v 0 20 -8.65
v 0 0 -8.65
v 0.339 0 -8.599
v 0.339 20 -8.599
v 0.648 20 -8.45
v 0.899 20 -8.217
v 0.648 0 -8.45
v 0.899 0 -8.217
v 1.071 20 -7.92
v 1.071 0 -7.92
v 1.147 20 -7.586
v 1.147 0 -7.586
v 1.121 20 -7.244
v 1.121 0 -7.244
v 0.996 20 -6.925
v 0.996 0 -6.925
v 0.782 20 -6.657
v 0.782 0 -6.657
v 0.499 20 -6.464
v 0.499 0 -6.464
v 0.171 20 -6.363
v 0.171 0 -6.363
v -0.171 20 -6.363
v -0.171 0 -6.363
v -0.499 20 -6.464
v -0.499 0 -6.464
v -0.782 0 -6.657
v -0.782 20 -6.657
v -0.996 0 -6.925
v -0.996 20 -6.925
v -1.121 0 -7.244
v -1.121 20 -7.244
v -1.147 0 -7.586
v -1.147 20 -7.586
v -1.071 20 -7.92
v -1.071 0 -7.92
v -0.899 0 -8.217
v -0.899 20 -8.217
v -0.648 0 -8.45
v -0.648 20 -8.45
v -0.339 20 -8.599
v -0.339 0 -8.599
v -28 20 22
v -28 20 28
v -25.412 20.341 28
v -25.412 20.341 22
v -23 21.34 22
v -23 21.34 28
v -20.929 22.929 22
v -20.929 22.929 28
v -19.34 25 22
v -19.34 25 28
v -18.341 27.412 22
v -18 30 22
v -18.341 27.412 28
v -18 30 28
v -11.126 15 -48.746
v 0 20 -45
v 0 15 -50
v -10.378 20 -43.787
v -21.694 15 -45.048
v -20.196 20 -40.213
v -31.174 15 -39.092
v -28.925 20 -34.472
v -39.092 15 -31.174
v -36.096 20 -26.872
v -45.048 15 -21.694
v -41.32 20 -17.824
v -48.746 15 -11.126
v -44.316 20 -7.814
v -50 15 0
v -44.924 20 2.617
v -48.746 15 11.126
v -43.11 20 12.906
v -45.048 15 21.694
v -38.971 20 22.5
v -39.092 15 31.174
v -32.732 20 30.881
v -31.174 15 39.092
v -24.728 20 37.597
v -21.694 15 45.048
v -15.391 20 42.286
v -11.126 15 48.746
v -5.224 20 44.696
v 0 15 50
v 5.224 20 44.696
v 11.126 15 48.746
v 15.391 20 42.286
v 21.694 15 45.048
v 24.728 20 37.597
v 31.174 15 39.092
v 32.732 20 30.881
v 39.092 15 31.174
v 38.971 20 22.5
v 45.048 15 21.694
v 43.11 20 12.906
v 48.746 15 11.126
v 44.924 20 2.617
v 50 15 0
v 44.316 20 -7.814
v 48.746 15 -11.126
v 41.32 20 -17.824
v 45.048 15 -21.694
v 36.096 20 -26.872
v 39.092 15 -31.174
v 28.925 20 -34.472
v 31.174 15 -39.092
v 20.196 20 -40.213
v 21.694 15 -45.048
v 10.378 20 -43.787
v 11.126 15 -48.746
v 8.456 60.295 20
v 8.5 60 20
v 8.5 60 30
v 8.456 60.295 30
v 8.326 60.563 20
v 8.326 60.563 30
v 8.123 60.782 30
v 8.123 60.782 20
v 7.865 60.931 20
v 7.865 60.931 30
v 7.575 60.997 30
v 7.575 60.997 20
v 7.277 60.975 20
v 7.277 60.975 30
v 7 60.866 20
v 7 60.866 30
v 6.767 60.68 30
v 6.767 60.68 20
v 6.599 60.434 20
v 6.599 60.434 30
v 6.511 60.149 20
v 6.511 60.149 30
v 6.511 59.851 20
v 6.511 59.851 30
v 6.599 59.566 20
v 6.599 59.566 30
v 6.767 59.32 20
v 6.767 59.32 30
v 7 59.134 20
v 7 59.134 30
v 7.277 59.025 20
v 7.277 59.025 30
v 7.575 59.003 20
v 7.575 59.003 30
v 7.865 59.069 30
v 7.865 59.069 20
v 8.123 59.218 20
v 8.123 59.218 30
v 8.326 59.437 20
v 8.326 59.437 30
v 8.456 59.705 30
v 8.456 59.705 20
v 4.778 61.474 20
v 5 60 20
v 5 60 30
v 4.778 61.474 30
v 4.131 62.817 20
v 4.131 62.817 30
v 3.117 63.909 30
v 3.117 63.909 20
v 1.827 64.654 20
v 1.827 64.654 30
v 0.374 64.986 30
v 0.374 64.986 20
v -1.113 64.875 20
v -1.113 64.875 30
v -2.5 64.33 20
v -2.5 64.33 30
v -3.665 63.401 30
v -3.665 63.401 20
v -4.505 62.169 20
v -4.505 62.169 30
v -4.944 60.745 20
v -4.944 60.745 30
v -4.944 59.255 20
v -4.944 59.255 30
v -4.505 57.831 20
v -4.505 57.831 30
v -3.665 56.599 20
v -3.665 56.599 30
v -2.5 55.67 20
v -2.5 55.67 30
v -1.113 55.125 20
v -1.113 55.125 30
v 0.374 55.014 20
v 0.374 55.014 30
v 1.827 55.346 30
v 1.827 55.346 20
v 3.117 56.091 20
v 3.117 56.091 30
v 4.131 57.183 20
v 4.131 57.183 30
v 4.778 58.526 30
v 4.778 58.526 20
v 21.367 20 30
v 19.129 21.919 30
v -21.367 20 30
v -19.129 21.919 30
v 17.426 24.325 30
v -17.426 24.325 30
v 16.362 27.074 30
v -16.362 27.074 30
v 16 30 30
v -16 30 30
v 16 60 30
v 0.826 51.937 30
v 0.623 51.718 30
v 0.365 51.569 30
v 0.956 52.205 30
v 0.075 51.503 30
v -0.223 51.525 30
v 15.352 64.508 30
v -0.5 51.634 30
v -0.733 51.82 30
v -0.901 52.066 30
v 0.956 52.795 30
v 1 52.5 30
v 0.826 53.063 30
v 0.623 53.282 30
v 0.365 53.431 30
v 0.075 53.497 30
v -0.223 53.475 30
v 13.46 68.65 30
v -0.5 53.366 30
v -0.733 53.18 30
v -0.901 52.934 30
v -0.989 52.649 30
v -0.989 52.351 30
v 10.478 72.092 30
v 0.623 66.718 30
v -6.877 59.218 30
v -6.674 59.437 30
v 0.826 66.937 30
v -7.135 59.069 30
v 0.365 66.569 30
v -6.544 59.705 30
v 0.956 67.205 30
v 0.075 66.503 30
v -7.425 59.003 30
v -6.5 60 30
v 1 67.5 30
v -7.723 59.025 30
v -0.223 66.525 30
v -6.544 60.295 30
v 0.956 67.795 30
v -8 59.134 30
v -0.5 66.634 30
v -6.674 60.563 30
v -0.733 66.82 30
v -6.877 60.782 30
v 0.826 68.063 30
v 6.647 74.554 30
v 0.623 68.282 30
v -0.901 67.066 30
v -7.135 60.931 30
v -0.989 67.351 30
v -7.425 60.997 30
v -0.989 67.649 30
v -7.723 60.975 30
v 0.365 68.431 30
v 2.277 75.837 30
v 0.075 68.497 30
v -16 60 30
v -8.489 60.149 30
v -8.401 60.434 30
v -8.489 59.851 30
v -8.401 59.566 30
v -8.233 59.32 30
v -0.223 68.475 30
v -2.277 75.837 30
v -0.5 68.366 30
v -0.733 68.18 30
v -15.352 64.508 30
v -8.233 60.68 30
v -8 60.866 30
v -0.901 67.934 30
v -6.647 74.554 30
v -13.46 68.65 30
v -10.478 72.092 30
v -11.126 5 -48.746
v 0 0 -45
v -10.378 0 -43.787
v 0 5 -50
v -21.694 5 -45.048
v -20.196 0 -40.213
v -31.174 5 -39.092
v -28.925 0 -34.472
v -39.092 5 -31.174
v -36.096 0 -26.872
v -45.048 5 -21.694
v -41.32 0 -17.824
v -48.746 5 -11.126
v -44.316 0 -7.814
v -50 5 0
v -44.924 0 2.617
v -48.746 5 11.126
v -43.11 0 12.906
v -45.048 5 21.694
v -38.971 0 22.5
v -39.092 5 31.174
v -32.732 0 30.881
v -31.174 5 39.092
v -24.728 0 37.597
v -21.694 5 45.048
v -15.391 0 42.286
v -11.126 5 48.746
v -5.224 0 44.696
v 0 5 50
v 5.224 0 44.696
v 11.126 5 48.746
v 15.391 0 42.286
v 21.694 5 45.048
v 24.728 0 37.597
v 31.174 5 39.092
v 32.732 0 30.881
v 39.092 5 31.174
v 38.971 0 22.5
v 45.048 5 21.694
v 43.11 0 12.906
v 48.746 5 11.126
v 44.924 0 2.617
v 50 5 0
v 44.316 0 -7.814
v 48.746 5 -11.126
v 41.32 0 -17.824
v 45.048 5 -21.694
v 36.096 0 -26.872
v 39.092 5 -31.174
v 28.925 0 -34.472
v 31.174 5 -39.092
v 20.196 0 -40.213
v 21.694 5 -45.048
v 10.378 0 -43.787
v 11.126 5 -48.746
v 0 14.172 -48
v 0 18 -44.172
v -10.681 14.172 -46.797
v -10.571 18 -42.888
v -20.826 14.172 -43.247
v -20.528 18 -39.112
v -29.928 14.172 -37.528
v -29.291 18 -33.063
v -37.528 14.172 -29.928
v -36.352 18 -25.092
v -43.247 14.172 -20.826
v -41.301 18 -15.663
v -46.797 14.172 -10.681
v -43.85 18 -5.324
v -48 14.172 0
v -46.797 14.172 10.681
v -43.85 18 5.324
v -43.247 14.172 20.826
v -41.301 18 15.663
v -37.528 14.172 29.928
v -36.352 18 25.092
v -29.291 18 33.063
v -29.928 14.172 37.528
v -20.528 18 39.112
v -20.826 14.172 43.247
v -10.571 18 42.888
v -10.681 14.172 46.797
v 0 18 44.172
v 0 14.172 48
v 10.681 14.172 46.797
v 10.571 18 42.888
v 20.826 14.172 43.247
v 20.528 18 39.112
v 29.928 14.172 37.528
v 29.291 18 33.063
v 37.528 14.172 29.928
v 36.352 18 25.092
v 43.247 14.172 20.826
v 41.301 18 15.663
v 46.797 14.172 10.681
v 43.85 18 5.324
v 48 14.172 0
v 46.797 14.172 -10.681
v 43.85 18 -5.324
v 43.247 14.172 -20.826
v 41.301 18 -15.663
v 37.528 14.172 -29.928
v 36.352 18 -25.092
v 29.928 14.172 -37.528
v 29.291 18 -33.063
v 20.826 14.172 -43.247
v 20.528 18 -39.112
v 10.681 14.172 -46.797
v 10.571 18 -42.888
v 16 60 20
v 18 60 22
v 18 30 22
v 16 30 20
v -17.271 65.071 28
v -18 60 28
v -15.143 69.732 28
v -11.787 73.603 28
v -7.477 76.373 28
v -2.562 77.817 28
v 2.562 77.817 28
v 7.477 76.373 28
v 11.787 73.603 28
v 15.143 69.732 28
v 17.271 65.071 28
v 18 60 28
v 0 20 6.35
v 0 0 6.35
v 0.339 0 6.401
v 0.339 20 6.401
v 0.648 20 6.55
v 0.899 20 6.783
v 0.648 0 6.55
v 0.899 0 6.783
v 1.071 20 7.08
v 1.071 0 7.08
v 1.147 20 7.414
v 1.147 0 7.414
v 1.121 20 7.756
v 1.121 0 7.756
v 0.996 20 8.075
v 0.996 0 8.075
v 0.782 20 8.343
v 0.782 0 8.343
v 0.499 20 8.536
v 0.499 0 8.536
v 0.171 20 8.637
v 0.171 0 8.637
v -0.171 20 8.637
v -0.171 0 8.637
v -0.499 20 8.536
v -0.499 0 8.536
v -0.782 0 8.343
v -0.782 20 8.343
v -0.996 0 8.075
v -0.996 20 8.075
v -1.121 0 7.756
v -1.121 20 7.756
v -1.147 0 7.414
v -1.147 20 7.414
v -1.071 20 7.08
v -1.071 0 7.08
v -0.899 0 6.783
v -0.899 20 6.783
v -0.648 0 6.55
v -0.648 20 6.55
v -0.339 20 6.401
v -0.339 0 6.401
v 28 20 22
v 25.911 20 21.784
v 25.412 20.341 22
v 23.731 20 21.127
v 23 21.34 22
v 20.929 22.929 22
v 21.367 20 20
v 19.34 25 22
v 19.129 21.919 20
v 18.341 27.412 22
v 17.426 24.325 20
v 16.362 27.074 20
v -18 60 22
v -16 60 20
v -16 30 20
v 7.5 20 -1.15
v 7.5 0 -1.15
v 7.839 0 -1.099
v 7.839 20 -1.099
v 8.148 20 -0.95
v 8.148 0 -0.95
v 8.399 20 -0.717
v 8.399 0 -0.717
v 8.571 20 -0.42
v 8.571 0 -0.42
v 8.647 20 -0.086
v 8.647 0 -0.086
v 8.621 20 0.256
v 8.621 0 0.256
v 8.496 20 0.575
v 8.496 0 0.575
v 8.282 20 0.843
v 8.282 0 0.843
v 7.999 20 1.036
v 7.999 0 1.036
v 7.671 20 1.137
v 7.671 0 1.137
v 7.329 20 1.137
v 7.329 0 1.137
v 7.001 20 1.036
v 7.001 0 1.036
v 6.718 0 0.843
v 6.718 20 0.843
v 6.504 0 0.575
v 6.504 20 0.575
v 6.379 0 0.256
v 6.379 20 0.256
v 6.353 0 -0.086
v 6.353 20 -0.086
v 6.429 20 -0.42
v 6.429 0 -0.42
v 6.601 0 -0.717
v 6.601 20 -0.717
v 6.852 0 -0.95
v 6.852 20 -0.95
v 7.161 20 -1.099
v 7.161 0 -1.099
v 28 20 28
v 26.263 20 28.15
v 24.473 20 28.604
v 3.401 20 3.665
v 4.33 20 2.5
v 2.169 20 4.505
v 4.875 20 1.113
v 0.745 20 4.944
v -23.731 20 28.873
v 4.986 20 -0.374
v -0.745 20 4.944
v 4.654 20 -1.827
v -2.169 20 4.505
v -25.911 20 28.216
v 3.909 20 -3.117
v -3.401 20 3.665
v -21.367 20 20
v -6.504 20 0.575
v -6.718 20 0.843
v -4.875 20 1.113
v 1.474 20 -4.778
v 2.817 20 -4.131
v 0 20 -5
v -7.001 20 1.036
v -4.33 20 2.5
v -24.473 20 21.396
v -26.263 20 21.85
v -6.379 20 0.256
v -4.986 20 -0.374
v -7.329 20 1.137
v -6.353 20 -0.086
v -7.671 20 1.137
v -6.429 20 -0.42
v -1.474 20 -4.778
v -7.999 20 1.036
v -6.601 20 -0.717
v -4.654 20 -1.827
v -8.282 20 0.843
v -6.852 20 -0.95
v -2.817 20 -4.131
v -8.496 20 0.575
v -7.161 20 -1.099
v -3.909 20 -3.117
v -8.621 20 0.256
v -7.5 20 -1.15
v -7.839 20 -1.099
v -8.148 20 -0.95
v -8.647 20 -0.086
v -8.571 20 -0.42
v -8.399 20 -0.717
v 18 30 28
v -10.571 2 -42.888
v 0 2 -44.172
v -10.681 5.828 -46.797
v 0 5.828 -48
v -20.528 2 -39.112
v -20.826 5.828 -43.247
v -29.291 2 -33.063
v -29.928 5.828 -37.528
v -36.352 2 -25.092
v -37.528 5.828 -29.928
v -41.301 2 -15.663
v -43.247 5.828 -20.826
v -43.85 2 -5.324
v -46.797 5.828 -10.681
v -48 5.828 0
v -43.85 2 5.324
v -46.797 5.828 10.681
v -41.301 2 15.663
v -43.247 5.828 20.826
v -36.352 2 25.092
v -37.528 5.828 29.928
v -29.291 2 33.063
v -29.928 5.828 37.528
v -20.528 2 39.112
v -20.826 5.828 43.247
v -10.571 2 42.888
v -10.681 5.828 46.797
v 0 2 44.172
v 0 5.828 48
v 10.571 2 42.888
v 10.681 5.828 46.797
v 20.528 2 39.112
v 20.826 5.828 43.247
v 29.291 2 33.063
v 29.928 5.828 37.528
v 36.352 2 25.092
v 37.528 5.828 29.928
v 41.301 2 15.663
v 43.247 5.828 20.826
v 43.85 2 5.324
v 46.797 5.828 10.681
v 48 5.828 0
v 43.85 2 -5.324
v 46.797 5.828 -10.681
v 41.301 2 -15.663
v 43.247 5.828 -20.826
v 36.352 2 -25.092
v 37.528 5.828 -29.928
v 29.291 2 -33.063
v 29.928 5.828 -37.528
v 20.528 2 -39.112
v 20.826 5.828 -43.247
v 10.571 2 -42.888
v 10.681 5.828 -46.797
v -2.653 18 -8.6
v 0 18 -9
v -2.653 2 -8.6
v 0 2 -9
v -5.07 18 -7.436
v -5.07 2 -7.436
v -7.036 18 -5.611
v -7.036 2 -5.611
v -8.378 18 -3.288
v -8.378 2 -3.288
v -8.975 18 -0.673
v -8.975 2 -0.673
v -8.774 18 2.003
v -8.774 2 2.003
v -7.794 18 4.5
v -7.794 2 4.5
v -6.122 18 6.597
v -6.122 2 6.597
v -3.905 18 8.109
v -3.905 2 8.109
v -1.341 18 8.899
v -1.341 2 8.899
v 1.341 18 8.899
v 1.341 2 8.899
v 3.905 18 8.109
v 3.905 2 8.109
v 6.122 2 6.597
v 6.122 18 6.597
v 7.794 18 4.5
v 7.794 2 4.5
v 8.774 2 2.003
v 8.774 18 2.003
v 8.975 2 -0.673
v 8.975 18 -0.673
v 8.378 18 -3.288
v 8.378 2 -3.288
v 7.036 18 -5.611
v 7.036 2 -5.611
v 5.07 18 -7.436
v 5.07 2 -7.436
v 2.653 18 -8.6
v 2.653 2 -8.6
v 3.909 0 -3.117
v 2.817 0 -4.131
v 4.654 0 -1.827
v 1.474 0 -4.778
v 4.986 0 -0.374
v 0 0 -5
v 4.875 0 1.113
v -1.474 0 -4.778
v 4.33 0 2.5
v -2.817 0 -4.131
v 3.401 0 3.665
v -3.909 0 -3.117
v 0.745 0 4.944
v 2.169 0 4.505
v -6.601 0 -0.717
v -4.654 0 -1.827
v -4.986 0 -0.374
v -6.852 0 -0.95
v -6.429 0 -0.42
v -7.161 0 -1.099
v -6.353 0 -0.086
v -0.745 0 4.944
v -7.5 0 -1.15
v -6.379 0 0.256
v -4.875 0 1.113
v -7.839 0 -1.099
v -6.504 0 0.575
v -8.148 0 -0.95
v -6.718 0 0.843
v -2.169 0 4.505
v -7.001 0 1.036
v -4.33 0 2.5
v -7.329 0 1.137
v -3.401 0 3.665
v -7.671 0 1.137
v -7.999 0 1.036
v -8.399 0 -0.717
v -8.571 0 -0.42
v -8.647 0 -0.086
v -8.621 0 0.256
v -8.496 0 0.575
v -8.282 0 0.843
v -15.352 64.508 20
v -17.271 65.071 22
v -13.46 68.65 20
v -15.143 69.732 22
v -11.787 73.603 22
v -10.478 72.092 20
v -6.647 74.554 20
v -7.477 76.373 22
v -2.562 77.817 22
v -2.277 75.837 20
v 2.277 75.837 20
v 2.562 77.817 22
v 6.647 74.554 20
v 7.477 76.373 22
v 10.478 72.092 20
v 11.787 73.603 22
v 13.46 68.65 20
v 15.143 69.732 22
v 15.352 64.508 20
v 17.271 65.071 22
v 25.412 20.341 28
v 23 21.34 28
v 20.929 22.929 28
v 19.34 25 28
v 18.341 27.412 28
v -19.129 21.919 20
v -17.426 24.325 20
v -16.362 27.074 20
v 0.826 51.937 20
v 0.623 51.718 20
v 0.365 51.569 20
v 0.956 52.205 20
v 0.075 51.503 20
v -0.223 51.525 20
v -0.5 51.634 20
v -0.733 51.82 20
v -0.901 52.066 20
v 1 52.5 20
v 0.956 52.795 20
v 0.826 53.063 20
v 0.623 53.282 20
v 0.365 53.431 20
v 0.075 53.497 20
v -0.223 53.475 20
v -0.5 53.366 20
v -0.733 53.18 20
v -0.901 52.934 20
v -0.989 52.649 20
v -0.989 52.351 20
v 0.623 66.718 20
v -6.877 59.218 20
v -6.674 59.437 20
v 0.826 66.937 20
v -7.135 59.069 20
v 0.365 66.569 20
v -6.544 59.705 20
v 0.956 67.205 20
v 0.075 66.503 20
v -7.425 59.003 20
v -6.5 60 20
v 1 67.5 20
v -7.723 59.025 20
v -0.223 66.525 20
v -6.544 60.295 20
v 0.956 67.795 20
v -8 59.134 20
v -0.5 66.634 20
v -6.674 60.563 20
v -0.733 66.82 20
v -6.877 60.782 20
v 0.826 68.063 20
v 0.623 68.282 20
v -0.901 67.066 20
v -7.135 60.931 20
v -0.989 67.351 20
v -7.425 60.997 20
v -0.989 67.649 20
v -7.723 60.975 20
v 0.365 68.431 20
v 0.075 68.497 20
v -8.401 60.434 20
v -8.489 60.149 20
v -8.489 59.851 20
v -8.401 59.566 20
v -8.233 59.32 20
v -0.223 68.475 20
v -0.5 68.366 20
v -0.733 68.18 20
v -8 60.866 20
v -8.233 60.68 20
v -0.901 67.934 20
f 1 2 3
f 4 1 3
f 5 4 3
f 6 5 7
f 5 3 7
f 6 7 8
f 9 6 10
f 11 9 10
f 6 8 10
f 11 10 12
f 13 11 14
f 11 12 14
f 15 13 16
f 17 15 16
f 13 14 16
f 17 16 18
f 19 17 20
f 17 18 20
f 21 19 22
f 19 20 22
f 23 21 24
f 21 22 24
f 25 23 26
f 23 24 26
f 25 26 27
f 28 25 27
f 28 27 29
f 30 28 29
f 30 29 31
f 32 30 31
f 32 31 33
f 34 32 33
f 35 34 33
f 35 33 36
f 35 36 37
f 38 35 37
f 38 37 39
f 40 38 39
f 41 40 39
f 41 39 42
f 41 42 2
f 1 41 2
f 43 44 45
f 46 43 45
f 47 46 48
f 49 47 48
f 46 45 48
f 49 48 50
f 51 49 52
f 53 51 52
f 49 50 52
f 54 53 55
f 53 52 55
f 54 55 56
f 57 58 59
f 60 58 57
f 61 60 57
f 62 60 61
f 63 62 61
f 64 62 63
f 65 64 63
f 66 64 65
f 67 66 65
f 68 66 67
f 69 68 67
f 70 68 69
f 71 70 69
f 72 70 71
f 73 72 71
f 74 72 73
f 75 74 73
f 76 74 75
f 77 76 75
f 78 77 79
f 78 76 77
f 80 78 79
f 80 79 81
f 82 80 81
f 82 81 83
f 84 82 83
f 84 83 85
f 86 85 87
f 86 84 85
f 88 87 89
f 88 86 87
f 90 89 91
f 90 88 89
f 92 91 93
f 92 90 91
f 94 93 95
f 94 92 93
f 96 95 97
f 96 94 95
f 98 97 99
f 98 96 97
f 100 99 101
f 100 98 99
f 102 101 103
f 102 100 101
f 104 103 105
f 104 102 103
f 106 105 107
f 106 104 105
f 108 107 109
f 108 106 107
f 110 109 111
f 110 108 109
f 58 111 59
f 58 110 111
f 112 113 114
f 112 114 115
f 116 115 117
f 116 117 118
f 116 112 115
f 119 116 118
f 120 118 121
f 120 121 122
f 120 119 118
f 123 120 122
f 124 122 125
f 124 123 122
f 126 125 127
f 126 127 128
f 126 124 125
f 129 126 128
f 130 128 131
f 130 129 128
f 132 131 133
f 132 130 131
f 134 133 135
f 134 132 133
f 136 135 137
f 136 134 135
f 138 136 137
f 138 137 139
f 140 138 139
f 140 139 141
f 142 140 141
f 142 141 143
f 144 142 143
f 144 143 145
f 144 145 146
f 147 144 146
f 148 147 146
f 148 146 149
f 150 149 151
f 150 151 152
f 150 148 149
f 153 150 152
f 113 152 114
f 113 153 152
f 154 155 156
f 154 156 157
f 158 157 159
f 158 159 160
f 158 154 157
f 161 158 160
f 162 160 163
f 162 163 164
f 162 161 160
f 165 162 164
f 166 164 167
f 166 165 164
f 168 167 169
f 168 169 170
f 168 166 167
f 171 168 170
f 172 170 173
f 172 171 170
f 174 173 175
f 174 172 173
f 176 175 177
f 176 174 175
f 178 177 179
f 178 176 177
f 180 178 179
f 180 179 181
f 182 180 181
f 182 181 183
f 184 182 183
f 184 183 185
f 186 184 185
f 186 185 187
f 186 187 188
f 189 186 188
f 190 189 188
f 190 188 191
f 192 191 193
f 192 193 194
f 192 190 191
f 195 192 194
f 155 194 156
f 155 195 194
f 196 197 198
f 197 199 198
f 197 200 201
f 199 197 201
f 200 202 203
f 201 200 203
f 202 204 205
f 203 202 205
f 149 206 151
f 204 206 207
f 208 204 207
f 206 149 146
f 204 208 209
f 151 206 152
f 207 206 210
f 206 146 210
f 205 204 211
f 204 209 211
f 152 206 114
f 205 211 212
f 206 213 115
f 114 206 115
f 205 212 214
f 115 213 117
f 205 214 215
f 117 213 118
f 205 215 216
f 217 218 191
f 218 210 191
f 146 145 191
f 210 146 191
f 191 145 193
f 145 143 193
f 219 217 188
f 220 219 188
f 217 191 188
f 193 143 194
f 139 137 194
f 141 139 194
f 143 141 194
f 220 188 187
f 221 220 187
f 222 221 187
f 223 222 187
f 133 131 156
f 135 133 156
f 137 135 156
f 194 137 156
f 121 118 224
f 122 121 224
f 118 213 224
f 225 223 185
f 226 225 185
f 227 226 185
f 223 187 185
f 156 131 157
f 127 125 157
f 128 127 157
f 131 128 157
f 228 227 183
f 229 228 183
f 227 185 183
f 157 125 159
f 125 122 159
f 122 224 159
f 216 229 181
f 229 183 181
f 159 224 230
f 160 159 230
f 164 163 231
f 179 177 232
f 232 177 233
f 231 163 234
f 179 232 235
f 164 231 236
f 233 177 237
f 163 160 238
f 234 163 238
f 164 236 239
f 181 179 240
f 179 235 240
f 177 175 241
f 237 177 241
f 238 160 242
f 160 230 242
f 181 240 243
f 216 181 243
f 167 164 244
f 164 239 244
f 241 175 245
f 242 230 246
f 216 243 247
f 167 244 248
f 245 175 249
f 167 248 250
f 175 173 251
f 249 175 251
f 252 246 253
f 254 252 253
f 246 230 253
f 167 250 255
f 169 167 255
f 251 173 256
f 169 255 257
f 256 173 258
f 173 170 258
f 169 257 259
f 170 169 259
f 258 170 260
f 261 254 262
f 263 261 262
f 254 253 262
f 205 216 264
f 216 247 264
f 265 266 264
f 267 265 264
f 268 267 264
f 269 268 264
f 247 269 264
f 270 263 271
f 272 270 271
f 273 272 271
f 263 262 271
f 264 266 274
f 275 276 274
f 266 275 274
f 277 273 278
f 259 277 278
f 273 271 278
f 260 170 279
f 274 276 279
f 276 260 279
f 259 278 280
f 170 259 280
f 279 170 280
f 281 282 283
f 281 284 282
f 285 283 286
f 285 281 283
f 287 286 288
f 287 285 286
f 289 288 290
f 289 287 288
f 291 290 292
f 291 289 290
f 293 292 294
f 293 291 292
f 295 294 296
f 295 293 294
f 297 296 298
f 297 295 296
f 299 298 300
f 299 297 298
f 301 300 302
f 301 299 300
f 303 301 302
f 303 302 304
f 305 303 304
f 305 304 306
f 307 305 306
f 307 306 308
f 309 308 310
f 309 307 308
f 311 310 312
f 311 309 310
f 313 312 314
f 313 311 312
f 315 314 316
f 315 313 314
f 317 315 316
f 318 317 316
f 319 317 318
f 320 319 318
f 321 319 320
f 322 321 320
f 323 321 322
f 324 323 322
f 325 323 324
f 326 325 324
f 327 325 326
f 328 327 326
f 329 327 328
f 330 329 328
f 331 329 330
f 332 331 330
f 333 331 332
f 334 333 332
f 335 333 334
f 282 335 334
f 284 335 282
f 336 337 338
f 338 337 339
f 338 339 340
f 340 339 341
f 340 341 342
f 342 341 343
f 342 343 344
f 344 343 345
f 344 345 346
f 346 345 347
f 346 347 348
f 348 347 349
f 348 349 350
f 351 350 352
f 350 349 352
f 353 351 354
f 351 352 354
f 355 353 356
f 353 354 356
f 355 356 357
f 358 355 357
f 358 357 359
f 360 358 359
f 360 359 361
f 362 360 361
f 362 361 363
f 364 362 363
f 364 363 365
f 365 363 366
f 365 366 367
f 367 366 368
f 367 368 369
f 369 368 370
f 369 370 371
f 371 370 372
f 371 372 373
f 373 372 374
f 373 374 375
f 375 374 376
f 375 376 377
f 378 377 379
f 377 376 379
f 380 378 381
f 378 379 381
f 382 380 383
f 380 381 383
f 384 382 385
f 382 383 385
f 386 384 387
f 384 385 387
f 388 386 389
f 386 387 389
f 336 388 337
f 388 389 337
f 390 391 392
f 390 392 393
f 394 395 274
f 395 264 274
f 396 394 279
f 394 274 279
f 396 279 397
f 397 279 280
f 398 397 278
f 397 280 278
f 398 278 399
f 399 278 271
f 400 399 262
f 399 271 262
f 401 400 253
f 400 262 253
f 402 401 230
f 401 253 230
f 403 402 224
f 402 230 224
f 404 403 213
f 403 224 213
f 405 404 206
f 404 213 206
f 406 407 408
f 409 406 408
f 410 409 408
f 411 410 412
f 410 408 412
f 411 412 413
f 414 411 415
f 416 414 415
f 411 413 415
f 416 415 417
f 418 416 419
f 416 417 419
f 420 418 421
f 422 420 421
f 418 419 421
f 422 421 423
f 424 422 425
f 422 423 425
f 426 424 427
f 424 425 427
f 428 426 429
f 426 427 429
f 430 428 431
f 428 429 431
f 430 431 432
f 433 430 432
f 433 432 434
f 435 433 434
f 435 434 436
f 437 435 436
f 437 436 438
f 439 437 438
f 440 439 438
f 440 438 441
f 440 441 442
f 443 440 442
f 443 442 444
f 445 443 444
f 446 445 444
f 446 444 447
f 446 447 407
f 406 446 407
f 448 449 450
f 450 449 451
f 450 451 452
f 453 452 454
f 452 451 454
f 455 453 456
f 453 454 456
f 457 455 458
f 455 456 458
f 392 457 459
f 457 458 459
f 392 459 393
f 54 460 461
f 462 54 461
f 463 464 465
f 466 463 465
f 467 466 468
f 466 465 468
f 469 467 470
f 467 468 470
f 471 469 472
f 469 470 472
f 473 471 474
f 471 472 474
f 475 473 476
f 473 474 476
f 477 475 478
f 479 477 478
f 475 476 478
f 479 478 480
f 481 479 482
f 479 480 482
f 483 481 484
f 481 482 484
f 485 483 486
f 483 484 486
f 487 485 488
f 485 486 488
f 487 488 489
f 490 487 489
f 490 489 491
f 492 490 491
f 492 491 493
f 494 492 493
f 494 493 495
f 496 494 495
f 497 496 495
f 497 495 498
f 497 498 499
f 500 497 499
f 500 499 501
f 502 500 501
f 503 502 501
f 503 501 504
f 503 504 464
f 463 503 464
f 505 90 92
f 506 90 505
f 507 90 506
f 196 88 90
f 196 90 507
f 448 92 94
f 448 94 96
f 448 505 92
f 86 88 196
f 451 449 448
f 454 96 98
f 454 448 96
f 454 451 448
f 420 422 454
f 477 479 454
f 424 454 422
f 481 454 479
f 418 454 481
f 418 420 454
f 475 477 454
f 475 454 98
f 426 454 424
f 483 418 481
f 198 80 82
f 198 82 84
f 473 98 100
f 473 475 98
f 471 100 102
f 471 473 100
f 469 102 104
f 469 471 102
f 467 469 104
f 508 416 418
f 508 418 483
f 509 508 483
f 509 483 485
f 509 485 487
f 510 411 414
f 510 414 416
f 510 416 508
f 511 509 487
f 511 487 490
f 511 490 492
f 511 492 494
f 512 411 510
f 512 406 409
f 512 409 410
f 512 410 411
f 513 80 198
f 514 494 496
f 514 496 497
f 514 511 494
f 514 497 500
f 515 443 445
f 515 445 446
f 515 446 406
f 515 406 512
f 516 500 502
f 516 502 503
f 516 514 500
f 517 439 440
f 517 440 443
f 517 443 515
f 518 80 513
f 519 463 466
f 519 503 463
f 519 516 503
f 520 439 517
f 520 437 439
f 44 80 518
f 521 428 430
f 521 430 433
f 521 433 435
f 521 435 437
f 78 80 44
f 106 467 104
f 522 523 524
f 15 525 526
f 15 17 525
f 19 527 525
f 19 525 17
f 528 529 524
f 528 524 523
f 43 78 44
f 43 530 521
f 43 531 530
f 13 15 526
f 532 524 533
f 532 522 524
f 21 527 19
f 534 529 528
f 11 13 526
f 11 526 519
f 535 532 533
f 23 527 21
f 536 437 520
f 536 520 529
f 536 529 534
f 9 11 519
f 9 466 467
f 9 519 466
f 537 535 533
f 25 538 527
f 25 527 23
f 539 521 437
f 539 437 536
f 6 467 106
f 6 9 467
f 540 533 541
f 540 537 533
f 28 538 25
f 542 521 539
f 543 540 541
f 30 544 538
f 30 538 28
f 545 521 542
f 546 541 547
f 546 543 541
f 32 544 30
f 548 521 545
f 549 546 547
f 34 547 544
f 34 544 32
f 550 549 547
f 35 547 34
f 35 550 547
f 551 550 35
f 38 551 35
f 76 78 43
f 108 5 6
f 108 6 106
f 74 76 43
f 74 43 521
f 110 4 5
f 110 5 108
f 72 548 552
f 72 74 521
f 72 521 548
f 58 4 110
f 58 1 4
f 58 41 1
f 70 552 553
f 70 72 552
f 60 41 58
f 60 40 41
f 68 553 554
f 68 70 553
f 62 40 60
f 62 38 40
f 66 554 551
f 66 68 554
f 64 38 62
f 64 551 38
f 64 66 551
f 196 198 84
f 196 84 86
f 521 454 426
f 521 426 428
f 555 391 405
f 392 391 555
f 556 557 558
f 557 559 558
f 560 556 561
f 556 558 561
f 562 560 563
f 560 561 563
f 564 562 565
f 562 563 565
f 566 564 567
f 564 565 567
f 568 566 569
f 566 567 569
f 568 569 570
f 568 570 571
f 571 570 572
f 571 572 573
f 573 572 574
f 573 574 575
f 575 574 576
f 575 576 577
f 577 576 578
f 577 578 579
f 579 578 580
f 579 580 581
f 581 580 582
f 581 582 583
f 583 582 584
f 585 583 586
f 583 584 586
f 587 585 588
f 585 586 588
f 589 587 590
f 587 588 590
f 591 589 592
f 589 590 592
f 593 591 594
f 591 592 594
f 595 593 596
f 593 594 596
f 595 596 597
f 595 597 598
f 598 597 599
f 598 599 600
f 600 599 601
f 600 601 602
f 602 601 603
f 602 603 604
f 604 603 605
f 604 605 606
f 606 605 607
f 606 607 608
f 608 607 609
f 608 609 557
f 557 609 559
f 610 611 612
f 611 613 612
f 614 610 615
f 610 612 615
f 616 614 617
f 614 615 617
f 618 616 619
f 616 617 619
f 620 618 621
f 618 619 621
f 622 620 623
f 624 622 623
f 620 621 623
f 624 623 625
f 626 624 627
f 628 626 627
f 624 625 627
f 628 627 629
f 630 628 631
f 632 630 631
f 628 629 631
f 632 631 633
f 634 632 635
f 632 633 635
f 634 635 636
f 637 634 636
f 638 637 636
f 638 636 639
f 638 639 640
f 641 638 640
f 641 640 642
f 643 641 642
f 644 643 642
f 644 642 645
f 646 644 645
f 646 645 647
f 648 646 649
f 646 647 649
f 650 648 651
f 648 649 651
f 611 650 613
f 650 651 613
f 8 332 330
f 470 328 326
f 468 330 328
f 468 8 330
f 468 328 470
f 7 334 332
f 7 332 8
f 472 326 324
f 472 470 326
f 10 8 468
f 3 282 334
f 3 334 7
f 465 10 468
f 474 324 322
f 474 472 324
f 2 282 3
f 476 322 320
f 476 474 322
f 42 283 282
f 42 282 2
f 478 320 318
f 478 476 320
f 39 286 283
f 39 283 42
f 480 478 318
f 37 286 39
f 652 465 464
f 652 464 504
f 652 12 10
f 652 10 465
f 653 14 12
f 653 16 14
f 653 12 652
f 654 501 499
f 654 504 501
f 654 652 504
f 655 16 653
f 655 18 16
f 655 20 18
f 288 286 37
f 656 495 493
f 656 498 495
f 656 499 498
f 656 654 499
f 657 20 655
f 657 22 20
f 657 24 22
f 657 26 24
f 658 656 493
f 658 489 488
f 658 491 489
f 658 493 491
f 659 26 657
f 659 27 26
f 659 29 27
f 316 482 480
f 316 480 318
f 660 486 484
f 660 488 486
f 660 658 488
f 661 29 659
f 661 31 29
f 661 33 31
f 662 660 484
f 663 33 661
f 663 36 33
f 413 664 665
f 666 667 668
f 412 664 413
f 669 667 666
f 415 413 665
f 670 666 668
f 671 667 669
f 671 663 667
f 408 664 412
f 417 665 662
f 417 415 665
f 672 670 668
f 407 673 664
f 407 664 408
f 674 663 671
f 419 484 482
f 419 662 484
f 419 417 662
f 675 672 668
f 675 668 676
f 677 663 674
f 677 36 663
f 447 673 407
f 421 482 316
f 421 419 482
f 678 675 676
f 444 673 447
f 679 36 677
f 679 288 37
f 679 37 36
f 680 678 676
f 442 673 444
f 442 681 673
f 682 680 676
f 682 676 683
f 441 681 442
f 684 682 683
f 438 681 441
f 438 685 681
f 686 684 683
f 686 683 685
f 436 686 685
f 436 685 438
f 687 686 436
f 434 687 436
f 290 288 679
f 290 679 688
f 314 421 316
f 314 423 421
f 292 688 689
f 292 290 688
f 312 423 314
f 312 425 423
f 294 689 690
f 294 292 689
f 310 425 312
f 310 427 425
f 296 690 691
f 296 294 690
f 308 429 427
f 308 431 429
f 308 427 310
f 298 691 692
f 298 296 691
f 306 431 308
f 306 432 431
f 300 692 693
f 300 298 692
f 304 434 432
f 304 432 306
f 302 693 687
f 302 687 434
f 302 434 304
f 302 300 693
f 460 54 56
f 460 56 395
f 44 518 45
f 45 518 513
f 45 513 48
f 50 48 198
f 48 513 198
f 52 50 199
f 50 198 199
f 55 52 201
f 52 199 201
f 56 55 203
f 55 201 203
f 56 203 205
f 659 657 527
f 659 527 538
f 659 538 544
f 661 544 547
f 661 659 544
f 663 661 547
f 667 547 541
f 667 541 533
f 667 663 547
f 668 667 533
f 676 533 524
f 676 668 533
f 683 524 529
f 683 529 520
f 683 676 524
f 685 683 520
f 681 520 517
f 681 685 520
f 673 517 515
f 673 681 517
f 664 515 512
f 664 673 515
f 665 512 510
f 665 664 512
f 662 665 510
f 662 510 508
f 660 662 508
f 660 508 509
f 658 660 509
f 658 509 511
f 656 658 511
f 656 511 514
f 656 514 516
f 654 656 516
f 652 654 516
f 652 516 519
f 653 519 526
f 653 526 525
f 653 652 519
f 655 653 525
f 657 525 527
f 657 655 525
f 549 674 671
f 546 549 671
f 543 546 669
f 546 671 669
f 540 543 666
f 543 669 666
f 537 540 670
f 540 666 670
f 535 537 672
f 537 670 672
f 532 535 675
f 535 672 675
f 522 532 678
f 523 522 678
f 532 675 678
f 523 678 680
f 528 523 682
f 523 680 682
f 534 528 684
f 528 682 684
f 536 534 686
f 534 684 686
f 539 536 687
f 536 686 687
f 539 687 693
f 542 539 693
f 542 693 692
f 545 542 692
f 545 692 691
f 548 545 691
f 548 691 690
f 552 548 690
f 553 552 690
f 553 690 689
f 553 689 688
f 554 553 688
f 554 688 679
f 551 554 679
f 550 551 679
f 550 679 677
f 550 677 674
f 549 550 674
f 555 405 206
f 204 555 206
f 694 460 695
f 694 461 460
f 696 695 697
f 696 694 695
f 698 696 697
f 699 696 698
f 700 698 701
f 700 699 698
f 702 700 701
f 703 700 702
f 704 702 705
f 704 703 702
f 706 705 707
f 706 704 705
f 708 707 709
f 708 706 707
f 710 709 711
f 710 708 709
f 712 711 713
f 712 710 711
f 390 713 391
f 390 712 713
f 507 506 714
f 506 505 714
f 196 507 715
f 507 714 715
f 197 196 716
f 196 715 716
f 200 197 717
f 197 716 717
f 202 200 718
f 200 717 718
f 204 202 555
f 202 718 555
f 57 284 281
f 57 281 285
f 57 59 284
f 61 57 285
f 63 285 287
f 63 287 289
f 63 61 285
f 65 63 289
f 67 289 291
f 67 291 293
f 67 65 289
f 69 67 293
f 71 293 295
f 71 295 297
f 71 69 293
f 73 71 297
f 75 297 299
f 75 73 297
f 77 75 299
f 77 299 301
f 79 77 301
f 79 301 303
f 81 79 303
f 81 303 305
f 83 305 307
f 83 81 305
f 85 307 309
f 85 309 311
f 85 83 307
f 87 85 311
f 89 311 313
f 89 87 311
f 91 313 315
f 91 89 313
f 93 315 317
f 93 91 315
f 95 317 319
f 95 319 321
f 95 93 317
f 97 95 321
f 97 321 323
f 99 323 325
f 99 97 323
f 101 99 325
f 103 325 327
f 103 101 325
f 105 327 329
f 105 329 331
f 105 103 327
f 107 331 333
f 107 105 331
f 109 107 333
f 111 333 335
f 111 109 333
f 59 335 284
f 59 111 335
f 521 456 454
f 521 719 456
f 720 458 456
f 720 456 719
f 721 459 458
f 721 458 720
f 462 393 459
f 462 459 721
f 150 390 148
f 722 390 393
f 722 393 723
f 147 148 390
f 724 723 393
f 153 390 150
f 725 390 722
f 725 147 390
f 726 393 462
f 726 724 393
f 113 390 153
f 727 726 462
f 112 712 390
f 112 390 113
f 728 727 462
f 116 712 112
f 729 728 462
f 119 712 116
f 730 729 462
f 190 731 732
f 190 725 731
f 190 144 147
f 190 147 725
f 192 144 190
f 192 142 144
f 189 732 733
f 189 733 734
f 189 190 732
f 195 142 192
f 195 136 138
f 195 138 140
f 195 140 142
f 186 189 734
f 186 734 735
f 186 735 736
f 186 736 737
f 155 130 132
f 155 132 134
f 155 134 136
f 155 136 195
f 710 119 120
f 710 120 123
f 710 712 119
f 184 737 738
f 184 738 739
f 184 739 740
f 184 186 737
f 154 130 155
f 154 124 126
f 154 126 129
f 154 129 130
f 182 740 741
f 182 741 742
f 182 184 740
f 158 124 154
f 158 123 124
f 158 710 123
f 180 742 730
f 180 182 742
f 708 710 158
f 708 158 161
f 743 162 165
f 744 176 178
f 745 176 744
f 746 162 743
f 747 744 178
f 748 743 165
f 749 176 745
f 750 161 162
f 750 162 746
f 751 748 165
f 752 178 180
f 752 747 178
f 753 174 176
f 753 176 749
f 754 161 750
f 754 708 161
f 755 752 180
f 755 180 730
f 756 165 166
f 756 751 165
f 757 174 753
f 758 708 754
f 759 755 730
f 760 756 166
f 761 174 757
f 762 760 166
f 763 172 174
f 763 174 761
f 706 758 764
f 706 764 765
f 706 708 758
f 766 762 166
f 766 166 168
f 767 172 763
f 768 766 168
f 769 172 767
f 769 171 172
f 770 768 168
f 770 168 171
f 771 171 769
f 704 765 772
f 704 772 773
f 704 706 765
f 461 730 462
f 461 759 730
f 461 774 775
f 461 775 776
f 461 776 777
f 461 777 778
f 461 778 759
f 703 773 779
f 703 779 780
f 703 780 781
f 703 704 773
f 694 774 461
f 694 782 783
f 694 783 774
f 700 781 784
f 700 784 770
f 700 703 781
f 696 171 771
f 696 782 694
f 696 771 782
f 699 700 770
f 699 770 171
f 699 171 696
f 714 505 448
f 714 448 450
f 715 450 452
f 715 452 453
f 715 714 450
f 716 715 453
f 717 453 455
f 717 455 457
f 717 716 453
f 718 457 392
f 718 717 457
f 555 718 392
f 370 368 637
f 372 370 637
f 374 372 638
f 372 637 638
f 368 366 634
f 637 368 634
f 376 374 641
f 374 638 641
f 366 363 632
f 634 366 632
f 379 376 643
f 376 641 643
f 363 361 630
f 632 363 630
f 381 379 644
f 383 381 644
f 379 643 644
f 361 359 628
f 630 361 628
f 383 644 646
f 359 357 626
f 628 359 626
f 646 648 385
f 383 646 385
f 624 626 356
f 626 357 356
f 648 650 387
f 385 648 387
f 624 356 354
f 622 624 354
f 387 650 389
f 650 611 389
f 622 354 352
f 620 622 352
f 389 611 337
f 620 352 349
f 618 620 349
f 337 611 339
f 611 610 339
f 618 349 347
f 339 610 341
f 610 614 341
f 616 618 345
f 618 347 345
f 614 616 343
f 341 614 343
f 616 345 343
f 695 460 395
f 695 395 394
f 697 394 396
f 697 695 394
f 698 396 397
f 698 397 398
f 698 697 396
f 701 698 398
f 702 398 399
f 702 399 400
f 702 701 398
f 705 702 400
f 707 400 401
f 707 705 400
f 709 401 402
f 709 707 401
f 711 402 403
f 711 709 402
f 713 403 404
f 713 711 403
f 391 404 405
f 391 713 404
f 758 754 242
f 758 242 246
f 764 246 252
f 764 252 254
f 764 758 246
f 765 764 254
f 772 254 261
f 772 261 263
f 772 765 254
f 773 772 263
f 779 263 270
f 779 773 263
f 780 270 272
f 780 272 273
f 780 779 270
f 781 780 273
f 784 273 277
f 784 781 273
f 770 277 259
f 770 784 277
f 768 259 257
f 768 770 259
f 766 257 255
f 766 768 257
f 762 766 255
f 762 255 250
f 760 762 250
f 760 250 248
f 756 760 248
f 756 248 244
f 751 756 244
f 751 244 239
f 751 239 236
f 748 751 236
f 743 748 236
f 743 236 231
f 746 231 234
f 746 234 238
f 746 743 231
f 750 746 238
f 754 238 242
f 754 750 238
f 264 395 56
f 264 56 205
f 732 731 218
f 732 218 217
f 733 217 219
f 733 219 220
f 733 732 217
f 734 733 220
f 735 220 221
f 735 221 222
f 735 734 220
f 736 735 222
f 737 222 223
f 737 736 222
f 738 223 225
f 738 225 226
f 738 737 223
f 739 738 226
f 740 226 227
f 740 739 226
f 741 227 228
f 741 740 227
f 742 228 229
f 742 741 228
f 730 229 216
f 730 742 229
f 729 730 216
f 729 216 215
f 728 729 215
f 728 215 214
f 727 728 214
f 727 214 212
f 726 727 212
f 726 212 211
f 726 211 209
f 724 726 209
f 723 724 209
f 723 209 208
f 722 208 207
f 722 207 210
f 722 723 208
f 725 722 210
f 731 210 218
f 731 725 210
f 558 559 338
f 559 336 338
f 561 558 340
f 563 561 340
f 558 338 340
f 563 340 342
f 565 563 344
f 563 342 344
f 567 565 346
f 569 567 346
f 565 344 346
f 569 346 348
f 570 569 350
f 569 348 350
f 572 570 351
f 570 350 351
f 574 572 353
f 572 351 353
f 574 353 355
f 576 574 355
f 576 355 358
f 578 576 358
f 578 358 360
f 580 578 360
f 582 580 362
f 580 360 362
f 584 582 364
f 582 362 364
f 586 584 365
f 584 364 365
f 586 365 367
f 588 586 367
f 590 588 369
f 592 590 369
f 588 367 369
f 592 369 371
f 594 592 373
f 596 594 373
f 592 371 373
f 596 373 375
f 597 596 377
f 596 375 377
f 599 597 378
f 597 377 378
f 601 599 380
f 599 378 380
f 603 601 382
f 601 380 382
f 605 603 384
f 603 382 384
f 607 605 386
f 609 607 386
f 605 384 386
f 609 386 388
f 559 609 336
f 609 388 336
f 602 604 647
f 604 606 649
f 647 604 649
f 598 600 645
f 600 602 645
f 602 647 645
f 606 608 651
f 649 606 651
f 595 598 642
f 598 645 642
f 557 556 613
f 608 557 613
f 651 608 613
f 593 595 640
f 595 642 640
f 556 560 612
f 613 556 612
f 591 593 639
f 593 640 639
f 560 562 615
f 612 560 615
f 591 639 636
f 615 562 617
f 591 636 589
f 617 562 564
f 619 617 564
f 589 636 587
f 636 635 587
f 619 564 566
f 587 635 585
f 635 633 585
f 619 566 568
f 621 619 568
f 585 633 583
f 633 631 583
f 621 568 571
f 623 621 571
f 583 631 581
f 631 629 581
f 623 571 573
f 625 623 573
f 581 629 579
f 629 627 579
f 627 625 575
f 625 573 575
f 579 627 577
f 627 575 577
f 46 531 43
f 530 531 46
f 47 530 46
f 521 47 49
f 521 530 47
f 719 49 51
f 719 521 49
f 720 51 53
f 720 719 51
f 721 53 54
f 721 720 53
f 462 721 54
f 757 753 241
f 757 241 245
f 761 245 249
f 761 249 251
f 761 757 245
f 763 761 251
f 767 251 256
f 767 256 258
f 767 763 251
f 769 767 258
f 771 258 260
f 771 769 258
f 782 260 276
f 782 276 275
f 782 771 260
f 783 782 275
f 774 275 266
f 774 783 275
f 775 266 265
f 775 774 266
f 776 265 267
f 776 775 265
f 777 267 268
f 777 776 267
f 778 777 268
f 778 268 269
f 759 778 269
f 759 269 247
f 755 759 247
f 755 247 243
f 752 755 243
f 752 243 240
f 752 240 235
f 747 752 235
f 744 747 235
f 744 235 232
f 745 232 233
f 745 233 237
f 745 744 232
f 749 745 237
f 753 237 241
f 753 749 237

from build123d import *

# Parameters (mm, degrees)
SKETCH2_R           = 1.15
SKETCH2_R_2         = 5
CUT_EXTRUDE1_DEPTH  = 74.484692283
BOSS_EXTRUDE1_START = 20
SKETCH6_R           = 5
SKETCH6_R_2         = 1
BOSS_EXTRUDE1_DEPTH = 10
FILLET1_R           = 10
CHAMFER1_SIZE       = 2


with BuildPart() as part:
    # Sketch1 → Revolve1 (revolve)
    with BuildSketch(Plane.XY, mode=Mode.PRIVATE) as revolve1_sk:
        Polygon((45, 0), (50, 5), (50, 15), (45, 20), (5, 20), (5, 0), align=None)
        Polygon((9, 2), (44.171572875, 2), (48, 5.828427125), (48, 14.171572875), (44.171572875, 18), (9, 18), align=None, mode=Mode.SUBTRACT)
    revolve(revolve1_sk.sketch.rotate(Axis((0, -3.9, 0), (0, 1, 0)), 90), axis=Axis((0, -3.9, 0), (0, 1, 0)))

    # Sketch2 → Cut-Extrude1 (cut, through all)
    with BuildSketch(Plane.XZ):
        with Locations(Location((7.5, 0, 0), (0, 0, 270))):
            Circle(SKETCH2_R)
        with Locations(Location((0, 7.5, 0), (0, 0, 270))):
            Circle(SKETCH2_R)
        with Locations(Location((-7.5, 0, 0), (0, 0, 270))):
            Circle(SKETCH2_R)
        with Locations(Location((0, -7.5, 0), (0, 0, 270))):
            Circle(SKETCH2_R)
        with Locations(Location((0, 0, 0), (0, 0, 270))):
            Circle(SKETCH2_R_2)
    extrude(amount=-CUT_EXTRUDE1_DEPTH, mode=Mode.SUBTRACT)

    # Sketch6 → Boss-Extrude1 (add)
    with BuildSketch(Plane.XY.offset(BOSS_EXTRUDE1_START)):
        with BuildLine():
            Line((18, 60), (18, 20))
            Line((18, 20), (-18, 20))
            Line((-18, 20), (-18, 60))
            ThreePointArc((-18, 60), (0, 78), (18, 60))
        make_face()
        with Locations((0, 60)):
            Circle(SKETCH6_R, mode=Mode.SUBTRACT)
        with Locations((0, 52.5)):
            Circle(SKETCH6_R_2, mode=Mode.SUBTRACT)
        with Locations((7.5, 60)):
            Circle(SKETCH6_R_2, mode=Mode.SUBTRACT)
        with Locations((0, 67.5)):
            Circle(SKETCH6_R_2, mode=Mode.SUBTRACT)
        with Locations((-7.5, 60)):
            Circle(SKETCH6_R_2, mode=Mode.SUBTRACT)
    extrude(amount=BOSS_EXTRUDE1_DEPTH)

    # Fillet1
    fillet1_edges = [part.edges().sort_by_distance(p)[0] for p in [
        (-18, 20, 25),
        (18, 20, 25),
    ]]
    fillet(fillet1_edges, radius=FILLET1_R)

    # Chamfer1
    # the kernel refuses this chamfer: 2 mm, written as the material it takes off along each edge
    with BuildSketch(Plane(origin=(0, 60, 30), x_dir=(-1, 0, 0), z_dir=(0, -1, 0))) as chamfer1_piece_1:
        Polygon((18, CHAMFER1_SIZE), (18 - CHAMFER1_SIZE, 0), (18, 0), align=None)
    revolve(axis=Axis((0, 60, 30), (0, 0, -1)), revolution_arc=180, mode=Mode.SUBTRACT)
    with BuildSketch(Plane(origin=(-18, 30, 30), x_dir=(-0.027495876610585647, 0, -0.9996219169112968), z_dir=(0, 1, 0)), Plane(origin=(18, 60, 30), x_dir=(0.027495876610585647, 0, -0.9996219169112968), z_dir=(0, -1, 0))) as chamfer1_piece_2:
        Polygon((CHAMFER1_SIZE * 0.999621916911, -CHAMFER1_SIZE * 0.0274958766106), (-CHAMFER1_SIZE * 0.0274958766106, -CHAMFER1_SIZE * 0.999621916911), (0, 0), align=None)
    extrude(amount=30, mode=Mode.SUBTRACT)
    with BuildSketch(Plane(origin=(0, 60, 20), x_dir=(-1, 0, 0), z_dir=(0, -1, 0))) as chamfer1_piece_3:
        Polygon((18, -CHAMFER1_SIZE), (18 - CHAMFER1_SIZE, 0), (18, 0), align=None)
    revolve(axis=Axis((0, 60, 20), (0, 0, -1)), revolution_arc=180, mode=Mode.SUBTRACT)
    with BuildSketch(Plane(origin=(-18, 30, 20), x_dir=(-0.027495876610585647, 0, 0.9996219169112968), z_dir=(0, 1, 0)), Plane(origin=(18, 60, 20), x_dir=(0.027495876610585647, 0, 0.9996219169112968), z_dir=(0, -1, 0))) as chamfer1_piece_4:
        Polygon((CHAMFER1_SIZE * 0.999621916911, CHAMFER1_SIZE * 0.0274958766106), (-CHAMFER1_SIZE * 0.0274958766106, CHAMFER1_SIZE * 0.999621916911), (0, 0), align=None)
    extrude(amount=30, mode=Mode.SUBTRACT)
    with BuildSketch(Plane(origin=(-28, 30, 20), x_dir=(-0.49213725734726604, -0.8705176160944192, 0), z_dir=(-0.8705176160944192, 0.49213725734726604, 0))) as chamfer1_piece_5_section:
        Polygon((10, CHAMFER1_SIZE), (10 + CHAMFER1_SIZE, 0), (10, 0), align=None)
    chamfer1_piece_5 = revolve(axis=Axis((-28, 30, 20), (0, 0, 1)), revolution_arc=119.481154356, mode=Mode.PRIVATE)
    chamfer1_piece_5 = split(chamfer1_piece_5, bisect_by=Plane(origin=(-20.846294556, 20, 20.72247208), z_dir=(0, 1, 0)), keep=Keep.TOP, mode=Mode.PRIVATE)
    add(chamfer1_piece_5, mode=Mode.SUBTRACT)
    with BuildSketch(Plane(origin=(-28, 30, 30), x_dir=(-0.49213725734726604, -0.8705176160944192, 0), z_dir=(-0.8705176160944192, 0.49213725734726604, 0))) as chamfer1_piece_6_section:
        Polygon((10, -CHAMFER1_SIZE), (10 + CHAMFER1_SIZE, 0), (10, 0), align=None)
    chamfer1_piece_6 = revolve(axis=Axis((-28, 30, 30), (0, 0, 1)), revolution_arc=119.481154356, mode=Mode.PRIVATE)
    chamfer1_piece_6 = split(chamfer1_piece_6, bisect_by=Plane(origin=(-20.846294556, 20, 29.27752792), z_dir=(0, 1, 0)), keep=Keep.TOP, mode=Mode.PRIVATE)
    add(chamfer1_piece_6, mode=Mode.SUBTRACT)
    with BuildSketch(Plane(origin=(28, 30, 20), x_dir=(0.49213725734726604, -0.8705176160944192, 0), z_dir=(0.8705176160944192, 0.49213725734726604, 0))) as chamfer1_piece_7_section:
        Polygon((10, -CHAMFER1_SIZE), (10 + CHAMFER1_SIZE, 0), (10, 0), align=None)
    chamfer1_piece_7 = revolve(axis=Axis((28, 30, 20), (0, 0, -1)), revolution_arc=119.481154356, mode=Mode.PRIVATE)
    chamfer1_piece_7 = split(chamfer1_piece_7, bisect_by=Plane(origin=(20.846294556, 20, 20.72247208), z_dir=(0, 1, 0)), keep=Keep.TOP, mode=Mode.PRIVATE)
    add(chamfer1_piece_7, mode=Mode.SUBTRACT)
    with BuildSketch(Plane(origin=(28, 30, 30), x_dir=(0.49213725734726604, -0.8705176160944192, 0), z_dir=(0.8705176160944192, 0.49213725734726604, 0))) as chamfer1_piece_8_section:
        Polygon((10 + CHAMFER1_SIZE, 0), (10, CHAMFER1_SIZE), (10, 0), align=None)
    chamfer1_piece_8 = revolve(axis=Axis((28, 30, 30), (0, 0, -1)), revolution_arc=119.481154356, mode=Mode.PRIVATE)
    chamfer1_piece_8 = split(chamfer1_piece_8, bisect_by=Plane(origin=(20.846294556, 20, 29.27752792), z_dir=(0, 1, 0)), keep=Keep.TOP, mode=Mode.PRIVATE)
    add(chamfer1_piece_8, mode=Mode.SUBTRACT)


solid = part.part
